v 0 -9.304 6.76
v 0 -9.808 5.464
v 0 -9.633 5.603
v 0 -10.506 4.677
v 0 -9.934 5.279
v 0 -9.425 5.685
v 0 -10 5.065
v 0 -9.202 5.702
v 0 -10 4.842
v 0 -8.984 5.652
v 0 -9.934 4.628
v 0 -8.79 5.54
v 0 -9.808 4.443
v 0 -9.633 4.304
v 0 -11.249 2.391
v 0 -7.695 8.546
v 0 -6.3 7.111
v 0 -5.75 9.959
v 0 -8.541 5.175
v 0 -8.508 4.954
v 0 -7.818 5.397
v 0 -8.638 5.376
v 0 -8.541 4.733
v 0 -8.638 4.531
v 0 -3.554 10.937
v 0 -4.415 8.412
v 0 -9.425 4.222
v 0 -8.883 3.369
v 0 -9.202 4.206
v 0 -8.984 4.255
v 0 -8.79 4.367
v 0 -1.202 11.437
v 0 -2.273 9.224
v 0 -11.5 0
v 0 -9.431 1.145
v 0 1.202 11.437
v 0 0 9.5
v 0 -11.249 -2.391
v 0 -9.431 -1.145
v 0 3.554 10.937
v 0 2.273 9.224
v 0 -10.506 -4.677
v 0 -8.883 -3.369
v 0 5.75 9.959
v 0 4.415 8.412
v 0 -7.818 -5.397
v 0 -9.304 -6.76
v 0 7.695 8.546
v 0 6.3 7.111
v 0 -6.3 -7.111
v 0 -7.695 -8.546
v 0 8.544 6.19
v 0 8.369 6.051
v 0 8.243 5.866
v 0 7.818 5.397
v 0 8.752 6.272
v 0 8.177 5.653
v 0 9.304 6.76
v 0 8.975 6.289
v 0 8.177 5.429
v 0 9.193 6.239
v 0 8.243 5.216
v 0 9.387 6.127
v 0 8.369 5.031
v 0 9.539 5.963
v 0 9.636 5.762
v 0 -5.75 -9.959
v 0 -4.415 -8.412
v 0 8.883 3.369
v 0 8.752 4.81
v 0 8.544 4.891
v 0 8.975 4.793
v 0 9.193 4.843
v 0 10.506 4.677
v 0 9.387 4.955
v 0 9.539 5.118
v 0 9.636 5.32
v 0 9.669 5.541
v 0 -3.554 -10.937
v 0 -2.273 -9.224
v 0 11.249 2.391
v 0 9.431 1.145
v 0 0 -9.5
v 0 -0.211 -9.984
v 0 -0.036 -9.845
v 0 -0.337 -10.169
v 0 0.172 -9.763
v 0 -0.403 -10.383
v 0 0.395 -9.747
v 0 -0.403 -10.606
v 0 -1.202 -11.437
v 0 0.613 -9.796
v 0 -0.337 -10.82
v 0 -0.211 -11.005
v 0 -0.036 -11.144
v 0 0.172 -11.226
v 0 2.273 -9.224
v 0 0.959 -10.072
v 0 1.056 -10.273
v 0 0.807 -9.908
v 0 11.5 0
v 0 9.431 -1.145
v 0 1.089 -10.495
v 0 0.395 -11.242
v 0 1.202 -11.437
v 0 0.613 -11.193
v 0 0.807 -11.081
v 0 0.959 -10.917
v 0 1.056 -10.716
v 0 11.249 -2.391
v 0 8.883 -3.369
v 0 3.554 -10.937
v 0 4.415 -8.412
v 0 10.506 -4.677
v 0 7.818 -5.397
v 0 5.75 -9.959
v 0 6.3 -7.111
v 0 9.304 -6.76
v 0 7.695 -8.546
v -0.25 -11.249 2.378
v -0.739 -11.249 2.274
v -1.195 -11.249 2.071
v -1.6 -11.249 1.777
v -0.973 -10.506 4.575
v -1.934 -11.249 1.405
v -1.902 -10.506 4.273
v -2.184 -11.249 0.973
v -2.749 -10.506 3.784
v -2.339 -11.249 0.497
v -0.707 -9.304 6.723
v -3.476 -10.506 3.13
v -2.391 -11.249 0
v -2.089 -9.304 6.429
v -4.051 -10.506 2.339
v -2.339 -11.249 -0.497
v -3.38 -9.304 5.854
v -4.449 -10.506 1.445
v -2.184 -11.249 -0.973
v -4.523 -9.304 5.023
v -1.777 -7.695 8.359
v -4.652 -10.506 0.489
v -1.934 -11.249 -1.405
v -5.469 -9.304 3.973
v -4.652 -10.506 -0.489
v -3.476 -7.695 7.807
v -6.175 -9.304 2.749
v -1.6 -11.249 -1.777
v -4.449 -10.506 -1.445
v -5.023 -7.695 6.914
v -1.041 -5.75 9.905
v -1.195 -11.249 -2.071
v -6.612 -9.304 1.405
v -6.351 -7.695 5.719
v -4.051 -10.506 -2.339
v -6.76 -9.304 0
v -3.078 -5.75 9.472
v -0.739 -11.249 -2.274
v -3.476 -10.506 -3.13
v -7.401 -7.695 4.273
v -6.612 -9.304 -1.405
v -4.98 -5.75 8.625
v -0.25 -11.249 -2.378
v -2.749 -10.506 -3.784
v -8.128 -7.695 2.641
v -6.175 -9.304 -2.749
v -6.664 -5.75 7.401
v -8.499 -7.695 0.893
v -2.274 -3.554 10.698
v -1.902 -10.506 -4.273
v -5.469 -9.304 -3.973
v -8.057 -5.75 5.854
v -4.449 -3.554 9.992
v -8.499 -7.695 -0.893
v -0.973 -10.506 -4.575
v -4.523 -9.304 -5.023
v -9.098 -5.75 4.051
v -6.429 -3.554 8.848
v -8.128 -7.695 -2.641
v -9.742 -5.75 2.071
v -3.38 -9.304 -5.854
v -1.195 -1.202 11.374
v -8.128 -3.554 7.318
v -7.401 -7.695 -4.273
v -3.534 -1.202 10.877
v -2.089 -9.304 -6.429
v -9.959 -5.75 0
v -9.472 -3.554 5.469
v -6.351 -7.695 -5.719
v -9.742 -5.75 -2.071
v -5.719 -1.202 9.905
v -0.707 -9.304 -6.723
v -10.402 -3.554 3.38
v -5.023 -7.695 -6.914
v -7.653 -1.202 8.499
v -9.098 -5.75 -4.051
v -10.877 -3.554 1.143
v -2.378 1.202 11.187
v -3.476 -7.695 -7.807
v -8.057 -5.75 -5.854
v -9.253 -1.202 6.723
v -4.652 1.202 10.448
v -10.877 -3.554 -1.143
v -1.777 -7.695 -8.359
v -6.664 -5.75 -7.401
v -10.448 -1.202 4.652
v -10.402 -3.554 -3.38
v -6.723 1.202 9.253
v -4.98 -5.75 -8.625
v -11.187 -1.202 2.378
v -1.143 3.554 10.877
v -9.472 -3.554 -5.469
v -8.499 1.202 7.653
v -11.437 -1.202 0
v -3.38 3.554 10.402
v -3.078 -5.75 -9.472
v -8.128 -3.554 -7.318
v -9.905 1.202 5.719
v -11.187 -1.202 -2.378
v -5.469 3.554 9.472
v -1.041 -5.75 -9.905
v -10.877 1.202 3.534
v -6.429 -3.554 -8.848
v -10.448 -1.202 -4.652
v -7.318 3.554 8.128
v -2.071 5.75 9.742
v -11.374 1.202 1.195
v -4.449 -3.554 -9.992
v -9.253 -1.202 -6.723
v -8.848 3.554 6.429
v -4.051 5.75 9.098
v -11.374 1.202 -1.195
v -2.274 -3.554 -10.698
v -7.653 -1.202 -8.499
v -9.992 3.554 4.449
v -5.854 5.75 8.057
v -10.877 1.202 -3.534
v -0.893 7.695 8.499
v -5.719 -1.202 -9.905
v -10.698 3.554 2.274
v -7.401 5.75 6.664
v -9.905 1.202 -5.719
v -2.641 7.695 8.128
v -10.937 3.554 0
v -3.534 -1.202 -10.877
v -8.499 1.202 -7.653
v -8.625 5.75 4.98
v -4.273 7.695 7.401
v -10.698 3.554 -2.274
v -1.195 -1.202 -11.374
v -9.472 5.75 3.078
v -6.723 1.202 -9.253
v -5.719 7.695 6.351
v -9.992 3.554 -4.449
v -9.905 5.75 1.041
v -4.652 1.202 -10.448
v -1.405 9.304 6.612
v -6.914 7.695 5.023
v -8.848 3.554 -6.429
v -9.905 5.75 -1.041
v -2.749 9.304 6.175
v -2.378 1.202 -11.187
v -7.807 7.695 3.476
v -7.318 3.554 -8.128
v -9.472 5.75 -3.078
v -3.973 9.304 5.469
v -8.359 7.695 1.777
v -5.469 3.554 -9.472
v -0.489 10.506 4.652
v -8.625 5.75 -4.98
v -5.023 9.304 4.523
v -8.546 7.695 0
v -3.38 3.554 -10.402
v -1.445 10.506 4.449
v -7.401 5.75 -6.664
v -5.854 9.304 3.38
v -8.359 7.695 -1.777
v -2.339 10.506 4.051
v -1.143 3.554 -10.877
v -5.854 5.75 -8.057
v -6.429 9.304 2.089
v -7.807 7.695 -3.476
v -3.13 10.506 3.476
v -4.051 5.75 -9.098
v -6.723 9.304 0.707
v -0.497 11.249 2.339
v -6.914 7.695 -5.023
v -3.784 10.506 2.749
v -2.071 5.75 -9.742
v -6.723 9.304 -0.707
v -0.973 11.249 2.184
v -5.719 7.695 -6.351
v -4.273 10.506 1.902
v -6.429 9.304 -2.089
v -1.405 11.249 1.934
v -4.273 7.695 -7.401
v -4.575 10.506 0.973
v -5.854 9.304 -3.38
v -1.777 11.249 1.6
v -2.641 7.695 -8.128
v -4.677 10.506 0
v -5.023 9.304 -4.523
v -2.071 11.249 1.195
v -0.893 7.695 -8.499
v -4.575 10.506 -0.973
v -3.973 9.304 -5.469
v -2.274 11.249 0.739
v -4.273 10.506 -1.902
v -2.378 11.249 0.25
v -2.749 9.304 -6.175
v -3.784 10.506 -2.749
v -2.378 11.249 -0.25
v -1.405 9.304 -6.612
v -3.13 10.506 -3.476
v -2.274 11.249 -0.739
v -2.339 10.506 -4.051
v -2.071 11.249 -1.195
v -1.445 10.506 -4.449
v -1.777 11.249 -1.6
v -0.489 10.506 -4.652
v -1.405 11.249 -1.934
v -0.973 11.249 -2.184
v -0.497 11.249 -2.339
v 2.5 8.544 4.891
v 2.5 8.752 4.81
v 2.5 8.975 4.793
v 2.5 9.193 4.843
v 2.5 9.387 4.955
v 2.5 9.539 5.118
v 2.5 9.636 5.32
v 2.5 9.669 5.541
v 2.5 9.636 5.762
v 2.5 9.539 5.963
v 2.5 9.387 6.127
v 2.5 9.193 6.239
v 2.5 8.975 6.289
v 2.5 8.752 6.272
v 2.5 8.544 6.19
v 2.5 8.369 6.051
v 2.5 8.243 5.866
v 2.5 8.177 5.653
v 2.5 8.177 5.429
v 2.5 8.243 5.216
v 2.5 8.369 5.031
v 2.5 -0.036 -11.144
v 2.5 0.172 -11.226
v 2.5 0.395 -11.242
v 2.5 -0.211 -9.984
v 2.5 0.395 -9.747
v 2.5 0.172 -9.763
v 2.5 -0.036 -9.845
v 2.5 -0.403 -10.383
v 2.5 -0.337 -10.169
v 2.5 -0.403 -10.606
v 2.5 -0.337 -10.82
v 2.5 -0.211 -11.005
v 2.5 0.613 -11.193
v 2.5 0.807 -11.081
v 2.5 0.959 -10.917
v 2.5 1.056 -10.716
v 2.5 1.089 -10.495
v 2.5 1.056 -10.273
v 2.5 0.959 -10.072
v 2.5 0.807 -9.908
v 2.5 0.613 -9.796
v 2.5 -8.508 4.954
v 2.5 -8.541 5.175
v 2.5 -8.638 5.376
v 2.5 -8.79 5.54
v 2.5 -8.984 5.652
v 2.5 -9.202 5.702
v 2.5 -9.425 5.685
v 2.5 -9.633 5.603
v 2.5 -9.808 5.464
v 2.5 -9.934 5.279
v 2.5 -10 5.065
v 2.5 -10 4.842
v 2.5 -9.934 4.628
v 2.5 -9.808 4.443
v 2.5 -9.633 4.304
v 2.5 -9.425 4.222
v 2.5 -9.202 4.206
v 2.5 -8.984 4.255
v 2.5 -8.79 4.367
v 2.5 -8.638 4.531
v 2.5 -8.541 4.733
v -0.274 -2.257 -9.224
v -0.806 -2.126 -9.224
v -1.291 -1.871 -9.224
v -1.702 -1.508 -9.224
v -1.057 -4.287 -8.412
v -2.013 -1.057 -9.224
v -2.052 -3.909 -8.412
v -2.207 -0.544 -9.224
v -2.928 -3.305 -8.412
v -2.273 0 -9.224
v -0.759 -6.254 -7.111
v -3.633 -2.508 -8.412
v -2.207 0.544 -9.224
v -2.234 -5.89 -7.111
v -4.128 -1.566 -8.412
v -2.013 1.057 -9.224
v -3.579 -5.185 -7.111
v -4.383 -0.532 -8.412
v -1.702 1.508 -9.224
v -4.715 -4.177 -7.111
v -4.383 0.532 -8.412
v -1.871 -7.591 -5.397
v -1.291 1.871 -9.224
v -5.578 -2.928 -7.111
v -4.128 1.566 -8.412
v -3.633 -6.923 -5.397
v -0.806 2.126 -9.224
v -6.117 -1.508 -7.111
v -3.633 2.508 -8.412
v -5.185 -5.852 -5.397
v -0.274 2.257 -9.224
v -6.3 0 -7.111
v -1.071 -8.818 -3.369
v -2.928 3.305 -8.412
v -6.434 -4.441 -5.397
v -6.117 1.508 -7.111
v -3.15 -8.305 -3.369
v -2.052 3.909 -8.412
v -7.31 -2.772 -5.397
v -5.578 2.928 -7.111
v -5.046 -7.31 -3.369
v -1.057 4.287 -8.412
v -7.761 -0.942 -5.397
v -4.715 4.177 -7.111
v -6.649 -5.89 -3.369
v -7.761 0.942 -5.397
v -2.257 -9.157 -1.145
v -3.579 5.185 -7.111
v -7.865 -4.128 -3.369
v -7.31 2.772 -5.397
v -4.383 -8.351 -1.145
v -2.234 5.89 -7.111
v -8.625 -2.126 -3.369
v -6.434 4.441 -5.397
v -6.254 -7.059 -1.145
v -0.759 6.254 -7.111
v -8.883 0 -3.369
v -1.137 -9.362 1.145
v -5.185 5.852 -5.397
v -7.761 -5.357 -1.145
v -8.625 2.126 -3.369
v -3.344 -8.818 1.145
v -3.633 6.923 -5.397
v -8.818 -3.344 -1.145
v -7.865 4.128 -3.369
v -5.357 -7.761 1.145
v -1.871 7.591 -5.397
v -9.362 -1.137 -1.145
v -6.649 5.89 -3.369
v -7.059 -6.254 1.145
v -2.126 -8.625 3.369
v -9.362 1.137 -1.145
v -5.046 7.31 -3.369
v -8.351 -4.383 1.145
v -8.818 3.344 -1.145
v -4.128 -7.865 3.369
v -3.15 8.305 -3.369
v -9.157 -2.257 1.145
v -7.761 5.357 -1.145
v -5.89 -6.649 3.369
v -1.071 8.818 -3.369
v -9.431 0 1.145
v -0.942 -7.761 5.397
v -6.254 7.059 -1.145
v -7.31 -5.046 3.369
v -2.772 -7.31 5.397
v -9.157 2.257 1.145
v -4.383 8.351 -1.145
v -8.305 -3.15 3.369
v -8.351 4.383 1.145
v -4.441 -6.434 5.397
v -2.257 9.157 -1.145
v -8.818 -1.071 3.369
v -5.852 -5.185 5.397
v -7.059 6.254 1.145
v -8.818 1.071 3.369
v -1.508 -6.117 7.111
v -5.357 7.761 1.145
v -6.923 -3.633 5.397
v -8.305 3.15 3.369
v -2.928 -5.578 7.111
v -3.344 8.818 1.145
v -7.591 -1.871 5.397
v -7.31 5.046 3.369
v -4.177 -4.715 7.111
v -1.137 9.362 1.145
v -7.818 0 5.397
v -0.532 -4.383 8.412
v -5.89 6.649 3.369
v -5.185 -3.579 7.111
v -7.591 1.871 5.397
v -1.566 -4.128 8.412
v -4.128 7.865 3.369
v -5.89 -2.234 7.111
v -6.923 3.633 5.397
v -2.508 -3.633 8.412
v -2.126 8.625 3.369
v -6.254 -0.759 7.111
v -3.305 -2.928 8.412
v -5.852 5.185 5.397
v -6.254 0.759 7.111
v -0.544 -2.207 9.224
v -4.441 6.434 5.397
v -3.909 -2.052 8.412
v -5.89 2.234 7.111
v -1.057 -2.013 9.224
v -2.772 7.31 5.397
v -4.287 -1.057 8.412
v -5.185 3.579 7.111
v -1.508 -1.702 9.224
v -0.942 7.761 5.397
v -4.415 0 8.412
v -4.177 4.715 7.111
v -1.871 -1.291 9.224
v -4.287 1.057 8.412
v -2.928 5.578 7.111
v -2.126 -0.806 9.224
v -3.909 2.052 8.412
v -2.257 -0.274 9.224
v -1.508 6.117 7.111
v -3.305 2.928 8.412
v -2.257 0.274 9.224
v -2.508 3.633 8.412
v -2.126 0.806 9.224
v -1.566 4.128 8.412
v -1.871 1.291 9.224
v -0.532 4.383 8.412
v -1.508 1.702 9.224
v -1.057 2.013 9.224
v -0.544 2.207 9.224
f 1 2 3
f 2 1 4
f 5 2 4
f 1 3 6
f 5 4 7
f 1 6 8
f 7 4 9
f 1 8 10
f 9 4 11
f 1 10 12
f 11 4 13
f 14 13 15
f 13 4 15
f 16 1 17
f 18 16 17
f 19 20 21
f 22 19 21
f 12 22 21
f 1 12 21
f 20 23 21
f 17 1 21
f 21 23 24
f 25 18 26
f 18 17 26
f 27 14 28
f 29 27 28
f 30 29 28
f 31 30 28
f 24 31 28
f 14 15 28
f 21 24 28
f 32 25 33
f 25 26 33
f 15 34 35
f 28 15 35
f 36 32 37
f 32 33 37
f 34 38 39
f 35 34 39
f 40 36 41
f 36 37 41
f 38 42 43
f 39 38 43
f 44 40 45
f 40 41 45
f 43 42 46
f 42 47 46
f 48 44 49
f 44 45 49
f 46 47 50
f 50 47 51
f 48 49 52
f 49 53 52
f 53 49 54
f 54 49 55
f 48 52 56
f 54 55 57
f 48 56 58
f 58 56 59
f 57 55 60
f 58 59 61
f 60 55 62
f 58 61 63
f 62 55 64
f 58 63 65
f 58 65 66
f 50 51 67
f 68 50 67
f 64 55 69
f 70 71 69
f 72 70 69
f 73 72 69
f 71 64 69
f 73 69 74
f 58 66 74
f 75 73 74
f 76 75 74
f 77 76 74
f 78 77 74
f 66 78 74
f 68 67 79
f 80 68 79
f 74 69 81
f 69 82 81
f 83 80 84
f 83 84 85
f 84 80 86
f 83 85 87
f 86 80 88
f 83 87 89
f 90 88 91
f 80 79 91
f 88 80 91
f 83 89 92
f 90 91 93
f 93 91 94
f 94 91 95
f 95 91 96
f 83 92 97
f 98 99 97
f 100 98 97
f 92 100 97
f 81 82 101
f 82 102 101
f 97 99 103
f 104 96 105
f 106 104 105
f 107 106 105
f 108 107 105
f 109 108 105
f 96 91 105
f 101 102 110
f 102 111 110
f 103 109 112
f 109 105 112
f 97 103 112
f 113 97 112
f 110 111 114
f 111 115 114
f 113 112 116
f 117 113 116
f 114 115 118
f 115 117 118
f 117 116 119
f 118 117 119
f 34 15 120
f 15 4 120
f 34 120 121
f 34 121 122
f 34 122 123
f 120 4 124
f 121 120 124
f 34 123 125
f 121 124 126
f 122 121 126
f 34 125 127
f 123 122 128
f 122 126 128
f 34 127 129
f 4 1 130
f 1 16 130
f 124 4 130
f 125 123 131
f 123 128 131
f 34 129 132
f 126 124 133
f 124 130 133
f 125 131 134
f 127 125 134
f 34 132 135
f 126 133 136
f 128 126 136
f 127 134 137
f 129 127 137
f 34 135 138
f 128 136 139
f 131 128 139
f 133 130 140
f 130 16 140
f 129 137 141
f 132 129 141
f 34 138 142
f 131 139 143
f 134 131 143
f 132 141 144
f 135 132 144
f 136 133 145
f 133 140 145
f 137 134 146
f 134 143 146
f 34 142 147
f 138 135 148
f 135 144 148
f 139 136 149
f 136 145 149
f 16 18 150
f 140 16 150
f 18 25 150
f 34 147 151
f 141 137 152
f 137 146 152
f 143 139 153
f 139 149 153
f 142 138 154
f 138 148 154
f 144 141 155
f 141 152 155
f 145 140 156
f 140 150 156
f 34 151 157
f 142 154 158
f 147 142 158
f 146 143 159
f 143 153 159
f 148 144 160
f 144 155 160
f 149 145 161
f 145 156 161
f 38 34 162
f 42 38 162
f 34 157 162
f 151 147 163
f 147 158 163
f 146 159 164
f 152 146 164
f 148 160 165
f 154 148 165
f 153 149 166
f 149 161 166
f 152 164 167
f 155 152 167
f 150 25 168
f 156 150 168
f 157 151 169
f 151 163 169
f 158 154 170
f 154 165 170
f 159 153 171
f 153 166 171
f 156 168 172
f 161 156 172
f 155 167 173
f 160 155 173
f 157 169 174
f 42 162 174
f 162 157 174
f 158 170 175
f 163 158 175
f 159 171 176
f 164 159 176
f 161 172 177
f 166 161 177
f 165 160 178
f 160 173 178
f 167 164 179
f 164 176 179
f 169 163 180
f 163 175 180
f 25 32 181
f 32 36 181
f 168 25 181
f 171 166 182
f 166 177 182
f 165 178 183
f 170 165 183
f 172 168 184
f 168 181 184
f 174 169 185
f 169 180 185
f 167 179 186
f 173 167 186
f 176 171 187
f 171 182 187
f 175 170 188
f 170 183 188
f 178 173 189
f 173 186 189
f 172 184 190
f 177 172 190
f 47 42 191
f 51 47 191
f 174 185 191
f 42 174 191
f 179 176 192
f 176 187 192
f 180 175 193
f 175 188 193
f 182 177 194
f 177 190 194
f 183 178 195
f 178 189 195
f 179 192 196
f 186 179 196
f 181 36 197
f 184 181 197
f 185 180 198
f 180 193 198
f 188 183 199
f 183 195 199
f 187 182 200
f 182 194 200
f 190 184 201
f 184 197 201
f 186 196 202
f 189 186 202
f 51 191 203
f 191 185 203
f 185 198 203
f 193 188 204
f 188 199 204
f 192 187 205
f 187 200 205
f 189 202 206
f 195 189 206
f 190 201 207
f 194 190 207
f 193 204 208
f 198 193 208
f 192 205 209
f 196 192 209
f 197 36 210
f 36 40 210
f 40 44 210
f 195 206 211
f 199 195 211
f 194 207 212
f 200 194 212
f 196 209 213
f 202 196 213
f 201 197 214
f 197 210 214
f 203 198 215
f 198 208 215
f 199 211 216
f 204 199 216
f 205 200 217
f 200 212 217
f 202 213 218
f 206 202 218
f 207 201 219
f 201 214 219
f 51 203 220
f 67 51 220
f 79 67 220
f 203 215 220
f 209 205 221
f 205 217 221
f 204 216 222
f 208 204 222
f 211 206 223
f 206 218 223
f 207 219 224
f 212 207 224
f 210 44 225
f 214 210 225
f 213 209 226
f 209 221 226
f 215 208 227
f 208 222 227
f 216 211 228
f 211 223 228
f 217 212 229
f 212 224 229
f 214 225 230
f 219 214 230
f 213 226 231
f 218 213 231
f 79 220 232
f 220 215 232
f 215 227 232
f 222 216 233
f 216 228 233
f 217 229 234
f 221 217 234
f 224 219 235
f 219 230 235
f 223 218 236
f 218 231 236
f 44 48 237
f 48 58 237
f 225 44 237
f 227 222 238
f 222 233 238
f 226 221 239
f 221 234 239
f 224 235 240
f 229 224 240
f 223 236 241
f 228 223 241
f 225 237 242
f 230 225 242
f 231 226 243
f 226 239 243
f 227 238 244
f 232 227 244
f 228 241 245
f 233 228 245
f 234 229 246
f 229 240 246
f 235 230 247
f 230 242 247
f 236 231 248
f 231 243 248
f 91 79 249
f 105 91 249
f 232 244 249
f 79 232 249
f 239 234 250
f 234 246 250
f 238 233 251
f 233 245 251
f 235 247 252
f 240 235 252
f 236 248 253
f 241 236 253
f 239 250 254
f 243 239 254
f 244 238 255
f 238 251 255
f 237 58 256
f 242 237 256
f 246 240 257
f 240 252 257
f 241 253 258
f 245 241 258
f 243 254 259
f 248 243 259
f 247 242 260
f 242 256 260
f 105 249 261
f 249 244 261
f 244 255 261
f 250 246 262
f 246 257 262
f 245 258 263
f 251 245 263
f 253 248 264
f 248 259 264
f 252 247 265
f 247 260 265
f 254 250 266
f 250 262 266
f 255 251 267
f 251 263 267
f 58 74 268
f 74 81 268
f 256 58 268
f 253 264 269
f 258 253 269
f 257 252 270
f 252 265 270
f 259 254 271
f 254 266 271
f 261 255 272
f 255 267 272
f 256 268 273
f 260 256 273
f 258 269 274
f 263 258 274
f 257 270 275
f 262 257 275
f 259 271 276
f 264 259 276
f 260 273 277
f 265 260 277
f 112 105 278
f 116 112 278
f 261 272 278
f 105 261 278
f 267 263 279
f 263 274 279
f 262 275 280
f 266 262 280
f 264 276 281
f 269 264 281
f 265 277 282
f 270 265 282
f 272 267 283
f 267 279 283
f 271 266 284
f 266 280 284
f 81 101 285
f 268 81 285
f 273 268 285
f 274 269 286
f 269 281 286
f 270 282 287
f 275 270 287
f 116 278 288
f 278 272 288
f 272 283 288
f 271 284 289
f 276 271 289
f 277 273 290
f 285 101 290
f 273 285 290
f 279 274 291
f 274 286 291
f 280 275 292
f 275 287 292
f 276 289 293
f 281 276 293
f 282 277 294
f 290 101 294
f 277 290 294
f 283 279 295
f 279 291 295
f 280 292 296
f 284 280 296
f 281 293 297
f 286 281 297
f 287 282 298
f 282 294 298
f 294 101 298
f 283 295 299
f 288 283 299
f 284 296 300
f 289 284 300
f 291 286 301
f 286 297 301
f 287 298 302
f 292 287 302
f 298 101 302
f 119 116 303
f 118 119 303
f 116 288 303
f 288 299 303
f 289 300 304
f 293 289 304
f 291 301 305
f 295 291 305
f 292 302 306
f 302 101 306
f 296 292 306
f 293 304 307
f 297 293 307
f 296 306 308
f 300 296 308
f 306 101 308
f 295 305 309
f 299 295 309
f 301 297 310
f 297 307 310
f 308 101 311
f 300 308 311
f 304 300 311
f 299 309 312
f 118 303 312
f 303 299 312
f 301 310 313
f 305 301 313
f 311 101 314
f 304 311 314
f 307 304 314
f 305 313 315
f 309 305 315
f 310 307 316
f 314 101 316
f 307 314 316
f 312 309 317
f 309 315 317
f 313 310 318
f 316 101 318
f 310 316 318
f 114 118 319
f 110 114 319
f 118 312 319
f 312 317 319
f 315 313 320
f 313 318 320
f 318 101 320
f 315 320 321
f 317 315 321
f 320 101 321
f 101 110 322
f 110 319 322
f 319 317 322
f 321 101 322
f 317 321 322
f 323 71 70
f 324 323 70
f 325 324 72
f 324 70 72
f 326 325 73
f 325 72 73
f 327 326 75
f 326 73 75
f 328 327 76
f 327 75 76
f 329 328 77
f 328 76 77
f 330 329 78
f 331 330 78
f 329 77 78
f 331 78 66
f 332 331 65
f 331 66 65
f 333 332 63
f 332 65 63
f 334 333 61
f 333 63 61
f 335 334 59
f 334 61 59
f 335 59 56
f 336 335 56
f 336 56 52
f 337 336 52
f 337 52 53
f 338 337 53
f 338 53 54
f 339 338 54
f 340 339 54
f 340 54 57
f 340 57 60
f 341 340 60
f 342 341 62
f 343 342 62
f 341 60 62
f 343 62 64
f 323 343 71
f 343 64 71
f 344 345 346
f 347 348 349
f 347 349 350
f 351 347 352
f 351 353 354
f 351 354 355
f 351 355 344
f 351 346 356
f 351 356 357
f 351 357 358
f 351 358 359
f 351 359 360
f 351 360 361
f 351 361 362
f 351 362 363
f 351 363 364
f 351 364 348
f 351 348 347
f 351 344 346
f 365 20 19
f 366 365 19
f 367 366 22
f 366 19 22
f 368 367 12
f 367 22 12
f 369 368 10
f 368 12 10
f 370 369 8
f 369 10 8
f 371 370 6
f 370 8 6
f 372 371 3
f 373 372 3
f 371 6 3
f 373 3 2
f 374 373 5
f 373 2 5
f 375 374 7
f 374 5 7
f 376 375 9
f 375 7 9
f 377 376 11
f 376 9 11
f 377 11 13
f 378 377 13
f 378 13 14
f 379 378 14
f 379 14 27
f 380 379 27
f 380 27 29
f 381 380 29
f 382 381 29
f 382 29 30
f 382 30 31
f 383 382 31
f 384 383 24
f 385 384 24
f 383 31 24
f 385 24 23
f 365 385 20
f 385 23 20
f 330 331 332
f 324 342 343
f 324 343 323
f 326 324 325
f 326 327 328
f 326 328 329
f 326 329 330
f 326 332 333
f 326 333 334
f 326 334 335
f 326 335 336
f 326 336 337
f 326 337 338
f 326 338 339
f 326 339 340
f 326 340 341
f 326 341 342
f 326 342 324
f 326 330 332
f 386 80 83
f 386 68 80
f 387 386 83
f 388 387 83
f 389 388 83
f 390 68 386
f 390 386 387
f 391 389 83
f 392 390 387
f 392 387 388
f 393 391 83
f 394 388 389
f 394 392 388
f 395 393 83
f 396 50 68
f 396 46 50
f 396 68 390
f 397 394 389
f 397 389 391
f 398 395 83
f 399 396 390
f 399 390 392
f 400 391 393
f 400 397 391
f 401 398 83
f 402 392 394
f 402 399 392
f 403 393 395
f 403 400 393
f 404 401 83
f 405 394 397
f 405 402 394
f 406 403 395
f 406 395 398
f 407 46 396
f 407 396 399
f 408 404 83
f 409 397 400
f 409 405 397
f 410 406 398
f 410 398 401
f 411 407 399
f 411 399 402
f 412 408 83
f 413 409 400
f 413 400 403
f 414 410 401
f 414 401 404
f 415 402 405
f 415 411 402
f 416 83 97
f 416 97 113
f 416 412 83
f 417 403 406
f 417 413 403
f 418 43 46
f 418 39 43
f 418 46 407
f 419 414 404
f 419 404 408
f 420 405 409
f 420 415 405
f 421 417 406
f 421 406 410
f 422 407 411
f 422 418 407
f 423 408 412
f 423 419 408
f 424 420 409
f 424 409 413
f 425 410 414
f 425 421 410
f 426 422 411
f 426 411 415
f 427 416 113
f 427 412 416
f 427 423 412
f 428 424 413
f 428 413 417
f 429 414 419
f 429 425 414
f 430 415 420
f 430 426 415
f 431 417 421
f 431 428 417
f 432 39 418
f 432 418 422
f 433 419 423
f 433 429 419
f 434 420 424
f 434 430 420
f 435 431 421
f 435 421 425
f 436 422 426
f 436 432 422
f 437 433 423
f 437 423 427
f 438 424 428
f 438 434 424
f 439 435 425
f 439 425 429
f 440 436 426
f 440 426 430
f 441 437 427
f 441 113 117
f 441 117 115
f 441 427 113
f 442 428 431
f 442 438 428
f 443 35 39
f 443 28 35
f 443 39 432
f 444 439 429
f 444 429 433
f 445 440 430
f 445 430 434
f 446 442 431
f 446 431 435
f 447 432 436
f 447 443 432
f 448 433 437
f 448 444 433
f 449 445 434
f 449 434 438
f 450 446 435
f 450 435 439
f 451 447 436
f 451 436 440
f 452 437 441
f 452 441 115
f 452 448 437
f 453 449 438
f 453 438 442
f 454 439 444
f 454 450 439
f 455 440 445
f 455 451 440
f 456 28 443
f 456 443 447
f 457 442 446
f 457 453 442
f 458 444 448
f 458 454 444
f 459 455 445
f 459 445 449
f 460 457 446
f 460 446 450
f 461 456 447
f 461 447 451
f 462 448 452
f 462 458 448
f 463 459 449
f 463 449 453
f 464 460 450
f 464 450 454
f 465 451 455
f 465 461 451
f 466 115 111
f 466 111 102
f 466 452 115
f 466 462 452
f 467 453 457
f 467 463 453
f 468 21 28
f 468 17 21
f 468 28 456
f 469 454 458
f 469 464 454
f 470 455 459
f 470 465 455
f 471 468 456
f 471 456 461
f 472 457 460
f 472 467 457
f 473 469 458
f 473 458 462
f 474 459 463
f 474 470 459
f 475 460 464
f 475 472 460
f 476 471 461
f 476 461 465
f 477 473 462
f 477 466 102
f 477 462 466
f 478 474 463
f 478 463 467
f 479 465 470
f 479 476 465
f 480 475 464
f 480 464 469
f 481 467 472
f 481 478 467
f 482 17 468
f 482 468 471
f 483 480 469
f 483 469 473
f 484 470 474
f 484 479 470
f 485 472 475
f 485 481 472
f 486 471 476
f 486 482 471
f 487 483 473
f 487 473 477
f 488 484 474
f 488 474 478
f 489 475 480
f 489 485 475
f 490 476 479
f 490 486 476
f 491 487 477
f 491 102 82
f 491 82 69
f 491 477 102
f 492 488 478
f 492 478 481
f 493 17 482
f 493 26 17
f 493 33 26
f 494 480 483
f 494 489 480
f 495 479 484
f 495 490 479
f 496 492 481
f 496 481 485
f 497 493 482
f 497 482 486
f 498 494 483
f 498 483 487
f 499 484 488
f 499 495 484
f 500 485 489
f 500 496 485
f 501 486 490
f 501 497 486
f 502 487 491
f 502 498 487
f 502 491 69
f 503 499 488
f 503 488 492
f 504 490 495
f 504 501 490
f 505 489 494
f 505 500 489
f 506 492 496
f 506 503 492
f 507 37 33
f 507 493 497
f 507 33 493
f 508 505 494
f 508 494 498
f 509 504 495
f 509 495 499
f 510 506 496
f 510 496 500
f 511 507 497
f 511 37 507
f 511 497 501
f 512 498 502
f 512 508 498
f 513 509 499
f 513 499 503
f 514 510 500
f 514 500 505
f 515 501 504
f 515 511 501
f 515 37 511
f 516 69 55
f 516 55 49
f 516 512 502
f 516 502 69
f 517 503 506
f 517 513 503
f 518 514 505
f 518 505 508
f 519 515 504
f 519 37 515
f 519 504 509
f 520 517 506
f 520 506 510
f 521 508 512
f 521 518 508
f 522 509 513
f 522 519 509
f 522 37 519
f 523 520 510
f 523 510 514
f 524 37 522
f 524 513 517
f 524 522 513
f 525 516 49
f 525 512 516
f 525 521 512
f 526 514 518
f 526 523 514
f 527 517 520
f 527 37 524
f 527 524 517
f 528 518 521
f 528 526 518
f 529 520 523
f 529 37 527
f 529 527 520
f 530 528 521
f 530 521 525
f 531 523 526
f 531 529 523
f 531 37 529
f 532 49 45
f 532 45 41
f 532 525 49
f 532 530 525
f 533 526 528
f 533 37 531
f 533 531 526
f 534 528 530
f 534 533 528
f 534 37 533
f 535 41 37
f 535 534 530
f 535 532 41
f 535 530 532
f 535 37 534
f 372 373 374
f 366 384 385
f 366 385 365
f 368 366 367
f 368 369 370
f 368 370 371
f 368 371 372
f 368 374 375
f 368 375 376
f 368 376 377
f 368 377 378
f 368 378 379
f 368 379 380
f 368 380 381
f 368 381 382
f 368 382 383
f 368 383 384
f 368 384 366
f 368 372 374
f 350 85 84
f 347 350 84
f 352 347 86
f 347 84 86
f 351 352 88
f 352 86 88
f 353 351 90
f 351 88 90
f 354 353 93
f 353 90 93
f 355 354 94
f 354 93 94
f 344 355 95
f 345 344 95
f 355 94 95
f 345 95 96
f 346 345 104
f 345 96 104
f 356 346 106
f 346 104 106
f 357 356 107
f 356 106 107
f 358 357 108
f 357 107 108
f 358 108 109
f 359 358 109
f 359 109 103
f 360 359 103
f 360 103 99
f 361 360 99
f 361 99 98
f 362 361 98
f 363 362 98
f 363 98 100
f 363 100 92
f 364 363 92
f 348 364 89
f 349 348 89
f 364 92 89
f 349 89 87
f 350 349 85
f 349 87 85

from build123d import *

# Parameters (mm, degrees)
F2_W            = 26.7493221909
F2_H            = 40.8729631454
F3_DEPTH        = 25
F3_DEPTH_BACK   = 37.9
F6_R            = 0.75
F7_DEPTH        = 2.5
F7_COPIES_COUNT = 3


# Not quite as in the source:
# - a pattern or mirror of a feature is missing from the dataset's text; its kind, count and spacing are read off the source's solid


with BuildPart() as f1:
    # F0 (on Top) → F1 (revolve)
    with BuildSketch(Plane.XY):
        with BuildLine():
            Line((0, 11.5), (0, -11.5))
            ThreePointArc((0, -11.5), (11.5, 0), (0, 11.5))
        make_face()
    revolve(axis=Axis((0, 0, 0), (0, -1, 0)))

    # F2 (on Top) → F3 (cut, two sides)
    with BuildSketch(Plane.XY) as f3_sk:
        with Locations((13.3746610954, -0.1069968566)):
            Rectangle(F2_W, F2_H)
    extrude(amount=-F3_DEPTH, mode=Mode.SUBTRACT)
    extrude(f3_sk.sketch, amount=F3_DEPTH_BACK, mode=Mode.SUBTRACT)

    # F4 (on face) → F5 (revolve, cut)
    with BuildSketch(Plane.YZ):
        with BuildLine():
            Line((0, 9.5), (0, -9.5))
            ThreePointArc((0, -9.5), (9.5, 0), (0, 9.5))
        make_face()
    revolve(axis=Axis((0, 0, 0), (0, 0, -1)), mode=Mode.SUBTRACT)

    # F6 (on face) → F7 (join)
    with BuildSketch(Plane.YZ):
        with Locations((-9.2580689408, 4.9536006588)):
            Circle(F6_R)
    f7 = extrude(amount=F7_DEPTH)

    # F7_copies: F7 ×3 about axis
    f7_copies_axis = Axis((0, 0, 0), (1, 0, 0))
    for i in range(1, F7_COPIES_COUNT):
        add(f7.rotate(f7_copies_axis, i * 360 / F7_COPIES_COUNT))


solid = f1.part
